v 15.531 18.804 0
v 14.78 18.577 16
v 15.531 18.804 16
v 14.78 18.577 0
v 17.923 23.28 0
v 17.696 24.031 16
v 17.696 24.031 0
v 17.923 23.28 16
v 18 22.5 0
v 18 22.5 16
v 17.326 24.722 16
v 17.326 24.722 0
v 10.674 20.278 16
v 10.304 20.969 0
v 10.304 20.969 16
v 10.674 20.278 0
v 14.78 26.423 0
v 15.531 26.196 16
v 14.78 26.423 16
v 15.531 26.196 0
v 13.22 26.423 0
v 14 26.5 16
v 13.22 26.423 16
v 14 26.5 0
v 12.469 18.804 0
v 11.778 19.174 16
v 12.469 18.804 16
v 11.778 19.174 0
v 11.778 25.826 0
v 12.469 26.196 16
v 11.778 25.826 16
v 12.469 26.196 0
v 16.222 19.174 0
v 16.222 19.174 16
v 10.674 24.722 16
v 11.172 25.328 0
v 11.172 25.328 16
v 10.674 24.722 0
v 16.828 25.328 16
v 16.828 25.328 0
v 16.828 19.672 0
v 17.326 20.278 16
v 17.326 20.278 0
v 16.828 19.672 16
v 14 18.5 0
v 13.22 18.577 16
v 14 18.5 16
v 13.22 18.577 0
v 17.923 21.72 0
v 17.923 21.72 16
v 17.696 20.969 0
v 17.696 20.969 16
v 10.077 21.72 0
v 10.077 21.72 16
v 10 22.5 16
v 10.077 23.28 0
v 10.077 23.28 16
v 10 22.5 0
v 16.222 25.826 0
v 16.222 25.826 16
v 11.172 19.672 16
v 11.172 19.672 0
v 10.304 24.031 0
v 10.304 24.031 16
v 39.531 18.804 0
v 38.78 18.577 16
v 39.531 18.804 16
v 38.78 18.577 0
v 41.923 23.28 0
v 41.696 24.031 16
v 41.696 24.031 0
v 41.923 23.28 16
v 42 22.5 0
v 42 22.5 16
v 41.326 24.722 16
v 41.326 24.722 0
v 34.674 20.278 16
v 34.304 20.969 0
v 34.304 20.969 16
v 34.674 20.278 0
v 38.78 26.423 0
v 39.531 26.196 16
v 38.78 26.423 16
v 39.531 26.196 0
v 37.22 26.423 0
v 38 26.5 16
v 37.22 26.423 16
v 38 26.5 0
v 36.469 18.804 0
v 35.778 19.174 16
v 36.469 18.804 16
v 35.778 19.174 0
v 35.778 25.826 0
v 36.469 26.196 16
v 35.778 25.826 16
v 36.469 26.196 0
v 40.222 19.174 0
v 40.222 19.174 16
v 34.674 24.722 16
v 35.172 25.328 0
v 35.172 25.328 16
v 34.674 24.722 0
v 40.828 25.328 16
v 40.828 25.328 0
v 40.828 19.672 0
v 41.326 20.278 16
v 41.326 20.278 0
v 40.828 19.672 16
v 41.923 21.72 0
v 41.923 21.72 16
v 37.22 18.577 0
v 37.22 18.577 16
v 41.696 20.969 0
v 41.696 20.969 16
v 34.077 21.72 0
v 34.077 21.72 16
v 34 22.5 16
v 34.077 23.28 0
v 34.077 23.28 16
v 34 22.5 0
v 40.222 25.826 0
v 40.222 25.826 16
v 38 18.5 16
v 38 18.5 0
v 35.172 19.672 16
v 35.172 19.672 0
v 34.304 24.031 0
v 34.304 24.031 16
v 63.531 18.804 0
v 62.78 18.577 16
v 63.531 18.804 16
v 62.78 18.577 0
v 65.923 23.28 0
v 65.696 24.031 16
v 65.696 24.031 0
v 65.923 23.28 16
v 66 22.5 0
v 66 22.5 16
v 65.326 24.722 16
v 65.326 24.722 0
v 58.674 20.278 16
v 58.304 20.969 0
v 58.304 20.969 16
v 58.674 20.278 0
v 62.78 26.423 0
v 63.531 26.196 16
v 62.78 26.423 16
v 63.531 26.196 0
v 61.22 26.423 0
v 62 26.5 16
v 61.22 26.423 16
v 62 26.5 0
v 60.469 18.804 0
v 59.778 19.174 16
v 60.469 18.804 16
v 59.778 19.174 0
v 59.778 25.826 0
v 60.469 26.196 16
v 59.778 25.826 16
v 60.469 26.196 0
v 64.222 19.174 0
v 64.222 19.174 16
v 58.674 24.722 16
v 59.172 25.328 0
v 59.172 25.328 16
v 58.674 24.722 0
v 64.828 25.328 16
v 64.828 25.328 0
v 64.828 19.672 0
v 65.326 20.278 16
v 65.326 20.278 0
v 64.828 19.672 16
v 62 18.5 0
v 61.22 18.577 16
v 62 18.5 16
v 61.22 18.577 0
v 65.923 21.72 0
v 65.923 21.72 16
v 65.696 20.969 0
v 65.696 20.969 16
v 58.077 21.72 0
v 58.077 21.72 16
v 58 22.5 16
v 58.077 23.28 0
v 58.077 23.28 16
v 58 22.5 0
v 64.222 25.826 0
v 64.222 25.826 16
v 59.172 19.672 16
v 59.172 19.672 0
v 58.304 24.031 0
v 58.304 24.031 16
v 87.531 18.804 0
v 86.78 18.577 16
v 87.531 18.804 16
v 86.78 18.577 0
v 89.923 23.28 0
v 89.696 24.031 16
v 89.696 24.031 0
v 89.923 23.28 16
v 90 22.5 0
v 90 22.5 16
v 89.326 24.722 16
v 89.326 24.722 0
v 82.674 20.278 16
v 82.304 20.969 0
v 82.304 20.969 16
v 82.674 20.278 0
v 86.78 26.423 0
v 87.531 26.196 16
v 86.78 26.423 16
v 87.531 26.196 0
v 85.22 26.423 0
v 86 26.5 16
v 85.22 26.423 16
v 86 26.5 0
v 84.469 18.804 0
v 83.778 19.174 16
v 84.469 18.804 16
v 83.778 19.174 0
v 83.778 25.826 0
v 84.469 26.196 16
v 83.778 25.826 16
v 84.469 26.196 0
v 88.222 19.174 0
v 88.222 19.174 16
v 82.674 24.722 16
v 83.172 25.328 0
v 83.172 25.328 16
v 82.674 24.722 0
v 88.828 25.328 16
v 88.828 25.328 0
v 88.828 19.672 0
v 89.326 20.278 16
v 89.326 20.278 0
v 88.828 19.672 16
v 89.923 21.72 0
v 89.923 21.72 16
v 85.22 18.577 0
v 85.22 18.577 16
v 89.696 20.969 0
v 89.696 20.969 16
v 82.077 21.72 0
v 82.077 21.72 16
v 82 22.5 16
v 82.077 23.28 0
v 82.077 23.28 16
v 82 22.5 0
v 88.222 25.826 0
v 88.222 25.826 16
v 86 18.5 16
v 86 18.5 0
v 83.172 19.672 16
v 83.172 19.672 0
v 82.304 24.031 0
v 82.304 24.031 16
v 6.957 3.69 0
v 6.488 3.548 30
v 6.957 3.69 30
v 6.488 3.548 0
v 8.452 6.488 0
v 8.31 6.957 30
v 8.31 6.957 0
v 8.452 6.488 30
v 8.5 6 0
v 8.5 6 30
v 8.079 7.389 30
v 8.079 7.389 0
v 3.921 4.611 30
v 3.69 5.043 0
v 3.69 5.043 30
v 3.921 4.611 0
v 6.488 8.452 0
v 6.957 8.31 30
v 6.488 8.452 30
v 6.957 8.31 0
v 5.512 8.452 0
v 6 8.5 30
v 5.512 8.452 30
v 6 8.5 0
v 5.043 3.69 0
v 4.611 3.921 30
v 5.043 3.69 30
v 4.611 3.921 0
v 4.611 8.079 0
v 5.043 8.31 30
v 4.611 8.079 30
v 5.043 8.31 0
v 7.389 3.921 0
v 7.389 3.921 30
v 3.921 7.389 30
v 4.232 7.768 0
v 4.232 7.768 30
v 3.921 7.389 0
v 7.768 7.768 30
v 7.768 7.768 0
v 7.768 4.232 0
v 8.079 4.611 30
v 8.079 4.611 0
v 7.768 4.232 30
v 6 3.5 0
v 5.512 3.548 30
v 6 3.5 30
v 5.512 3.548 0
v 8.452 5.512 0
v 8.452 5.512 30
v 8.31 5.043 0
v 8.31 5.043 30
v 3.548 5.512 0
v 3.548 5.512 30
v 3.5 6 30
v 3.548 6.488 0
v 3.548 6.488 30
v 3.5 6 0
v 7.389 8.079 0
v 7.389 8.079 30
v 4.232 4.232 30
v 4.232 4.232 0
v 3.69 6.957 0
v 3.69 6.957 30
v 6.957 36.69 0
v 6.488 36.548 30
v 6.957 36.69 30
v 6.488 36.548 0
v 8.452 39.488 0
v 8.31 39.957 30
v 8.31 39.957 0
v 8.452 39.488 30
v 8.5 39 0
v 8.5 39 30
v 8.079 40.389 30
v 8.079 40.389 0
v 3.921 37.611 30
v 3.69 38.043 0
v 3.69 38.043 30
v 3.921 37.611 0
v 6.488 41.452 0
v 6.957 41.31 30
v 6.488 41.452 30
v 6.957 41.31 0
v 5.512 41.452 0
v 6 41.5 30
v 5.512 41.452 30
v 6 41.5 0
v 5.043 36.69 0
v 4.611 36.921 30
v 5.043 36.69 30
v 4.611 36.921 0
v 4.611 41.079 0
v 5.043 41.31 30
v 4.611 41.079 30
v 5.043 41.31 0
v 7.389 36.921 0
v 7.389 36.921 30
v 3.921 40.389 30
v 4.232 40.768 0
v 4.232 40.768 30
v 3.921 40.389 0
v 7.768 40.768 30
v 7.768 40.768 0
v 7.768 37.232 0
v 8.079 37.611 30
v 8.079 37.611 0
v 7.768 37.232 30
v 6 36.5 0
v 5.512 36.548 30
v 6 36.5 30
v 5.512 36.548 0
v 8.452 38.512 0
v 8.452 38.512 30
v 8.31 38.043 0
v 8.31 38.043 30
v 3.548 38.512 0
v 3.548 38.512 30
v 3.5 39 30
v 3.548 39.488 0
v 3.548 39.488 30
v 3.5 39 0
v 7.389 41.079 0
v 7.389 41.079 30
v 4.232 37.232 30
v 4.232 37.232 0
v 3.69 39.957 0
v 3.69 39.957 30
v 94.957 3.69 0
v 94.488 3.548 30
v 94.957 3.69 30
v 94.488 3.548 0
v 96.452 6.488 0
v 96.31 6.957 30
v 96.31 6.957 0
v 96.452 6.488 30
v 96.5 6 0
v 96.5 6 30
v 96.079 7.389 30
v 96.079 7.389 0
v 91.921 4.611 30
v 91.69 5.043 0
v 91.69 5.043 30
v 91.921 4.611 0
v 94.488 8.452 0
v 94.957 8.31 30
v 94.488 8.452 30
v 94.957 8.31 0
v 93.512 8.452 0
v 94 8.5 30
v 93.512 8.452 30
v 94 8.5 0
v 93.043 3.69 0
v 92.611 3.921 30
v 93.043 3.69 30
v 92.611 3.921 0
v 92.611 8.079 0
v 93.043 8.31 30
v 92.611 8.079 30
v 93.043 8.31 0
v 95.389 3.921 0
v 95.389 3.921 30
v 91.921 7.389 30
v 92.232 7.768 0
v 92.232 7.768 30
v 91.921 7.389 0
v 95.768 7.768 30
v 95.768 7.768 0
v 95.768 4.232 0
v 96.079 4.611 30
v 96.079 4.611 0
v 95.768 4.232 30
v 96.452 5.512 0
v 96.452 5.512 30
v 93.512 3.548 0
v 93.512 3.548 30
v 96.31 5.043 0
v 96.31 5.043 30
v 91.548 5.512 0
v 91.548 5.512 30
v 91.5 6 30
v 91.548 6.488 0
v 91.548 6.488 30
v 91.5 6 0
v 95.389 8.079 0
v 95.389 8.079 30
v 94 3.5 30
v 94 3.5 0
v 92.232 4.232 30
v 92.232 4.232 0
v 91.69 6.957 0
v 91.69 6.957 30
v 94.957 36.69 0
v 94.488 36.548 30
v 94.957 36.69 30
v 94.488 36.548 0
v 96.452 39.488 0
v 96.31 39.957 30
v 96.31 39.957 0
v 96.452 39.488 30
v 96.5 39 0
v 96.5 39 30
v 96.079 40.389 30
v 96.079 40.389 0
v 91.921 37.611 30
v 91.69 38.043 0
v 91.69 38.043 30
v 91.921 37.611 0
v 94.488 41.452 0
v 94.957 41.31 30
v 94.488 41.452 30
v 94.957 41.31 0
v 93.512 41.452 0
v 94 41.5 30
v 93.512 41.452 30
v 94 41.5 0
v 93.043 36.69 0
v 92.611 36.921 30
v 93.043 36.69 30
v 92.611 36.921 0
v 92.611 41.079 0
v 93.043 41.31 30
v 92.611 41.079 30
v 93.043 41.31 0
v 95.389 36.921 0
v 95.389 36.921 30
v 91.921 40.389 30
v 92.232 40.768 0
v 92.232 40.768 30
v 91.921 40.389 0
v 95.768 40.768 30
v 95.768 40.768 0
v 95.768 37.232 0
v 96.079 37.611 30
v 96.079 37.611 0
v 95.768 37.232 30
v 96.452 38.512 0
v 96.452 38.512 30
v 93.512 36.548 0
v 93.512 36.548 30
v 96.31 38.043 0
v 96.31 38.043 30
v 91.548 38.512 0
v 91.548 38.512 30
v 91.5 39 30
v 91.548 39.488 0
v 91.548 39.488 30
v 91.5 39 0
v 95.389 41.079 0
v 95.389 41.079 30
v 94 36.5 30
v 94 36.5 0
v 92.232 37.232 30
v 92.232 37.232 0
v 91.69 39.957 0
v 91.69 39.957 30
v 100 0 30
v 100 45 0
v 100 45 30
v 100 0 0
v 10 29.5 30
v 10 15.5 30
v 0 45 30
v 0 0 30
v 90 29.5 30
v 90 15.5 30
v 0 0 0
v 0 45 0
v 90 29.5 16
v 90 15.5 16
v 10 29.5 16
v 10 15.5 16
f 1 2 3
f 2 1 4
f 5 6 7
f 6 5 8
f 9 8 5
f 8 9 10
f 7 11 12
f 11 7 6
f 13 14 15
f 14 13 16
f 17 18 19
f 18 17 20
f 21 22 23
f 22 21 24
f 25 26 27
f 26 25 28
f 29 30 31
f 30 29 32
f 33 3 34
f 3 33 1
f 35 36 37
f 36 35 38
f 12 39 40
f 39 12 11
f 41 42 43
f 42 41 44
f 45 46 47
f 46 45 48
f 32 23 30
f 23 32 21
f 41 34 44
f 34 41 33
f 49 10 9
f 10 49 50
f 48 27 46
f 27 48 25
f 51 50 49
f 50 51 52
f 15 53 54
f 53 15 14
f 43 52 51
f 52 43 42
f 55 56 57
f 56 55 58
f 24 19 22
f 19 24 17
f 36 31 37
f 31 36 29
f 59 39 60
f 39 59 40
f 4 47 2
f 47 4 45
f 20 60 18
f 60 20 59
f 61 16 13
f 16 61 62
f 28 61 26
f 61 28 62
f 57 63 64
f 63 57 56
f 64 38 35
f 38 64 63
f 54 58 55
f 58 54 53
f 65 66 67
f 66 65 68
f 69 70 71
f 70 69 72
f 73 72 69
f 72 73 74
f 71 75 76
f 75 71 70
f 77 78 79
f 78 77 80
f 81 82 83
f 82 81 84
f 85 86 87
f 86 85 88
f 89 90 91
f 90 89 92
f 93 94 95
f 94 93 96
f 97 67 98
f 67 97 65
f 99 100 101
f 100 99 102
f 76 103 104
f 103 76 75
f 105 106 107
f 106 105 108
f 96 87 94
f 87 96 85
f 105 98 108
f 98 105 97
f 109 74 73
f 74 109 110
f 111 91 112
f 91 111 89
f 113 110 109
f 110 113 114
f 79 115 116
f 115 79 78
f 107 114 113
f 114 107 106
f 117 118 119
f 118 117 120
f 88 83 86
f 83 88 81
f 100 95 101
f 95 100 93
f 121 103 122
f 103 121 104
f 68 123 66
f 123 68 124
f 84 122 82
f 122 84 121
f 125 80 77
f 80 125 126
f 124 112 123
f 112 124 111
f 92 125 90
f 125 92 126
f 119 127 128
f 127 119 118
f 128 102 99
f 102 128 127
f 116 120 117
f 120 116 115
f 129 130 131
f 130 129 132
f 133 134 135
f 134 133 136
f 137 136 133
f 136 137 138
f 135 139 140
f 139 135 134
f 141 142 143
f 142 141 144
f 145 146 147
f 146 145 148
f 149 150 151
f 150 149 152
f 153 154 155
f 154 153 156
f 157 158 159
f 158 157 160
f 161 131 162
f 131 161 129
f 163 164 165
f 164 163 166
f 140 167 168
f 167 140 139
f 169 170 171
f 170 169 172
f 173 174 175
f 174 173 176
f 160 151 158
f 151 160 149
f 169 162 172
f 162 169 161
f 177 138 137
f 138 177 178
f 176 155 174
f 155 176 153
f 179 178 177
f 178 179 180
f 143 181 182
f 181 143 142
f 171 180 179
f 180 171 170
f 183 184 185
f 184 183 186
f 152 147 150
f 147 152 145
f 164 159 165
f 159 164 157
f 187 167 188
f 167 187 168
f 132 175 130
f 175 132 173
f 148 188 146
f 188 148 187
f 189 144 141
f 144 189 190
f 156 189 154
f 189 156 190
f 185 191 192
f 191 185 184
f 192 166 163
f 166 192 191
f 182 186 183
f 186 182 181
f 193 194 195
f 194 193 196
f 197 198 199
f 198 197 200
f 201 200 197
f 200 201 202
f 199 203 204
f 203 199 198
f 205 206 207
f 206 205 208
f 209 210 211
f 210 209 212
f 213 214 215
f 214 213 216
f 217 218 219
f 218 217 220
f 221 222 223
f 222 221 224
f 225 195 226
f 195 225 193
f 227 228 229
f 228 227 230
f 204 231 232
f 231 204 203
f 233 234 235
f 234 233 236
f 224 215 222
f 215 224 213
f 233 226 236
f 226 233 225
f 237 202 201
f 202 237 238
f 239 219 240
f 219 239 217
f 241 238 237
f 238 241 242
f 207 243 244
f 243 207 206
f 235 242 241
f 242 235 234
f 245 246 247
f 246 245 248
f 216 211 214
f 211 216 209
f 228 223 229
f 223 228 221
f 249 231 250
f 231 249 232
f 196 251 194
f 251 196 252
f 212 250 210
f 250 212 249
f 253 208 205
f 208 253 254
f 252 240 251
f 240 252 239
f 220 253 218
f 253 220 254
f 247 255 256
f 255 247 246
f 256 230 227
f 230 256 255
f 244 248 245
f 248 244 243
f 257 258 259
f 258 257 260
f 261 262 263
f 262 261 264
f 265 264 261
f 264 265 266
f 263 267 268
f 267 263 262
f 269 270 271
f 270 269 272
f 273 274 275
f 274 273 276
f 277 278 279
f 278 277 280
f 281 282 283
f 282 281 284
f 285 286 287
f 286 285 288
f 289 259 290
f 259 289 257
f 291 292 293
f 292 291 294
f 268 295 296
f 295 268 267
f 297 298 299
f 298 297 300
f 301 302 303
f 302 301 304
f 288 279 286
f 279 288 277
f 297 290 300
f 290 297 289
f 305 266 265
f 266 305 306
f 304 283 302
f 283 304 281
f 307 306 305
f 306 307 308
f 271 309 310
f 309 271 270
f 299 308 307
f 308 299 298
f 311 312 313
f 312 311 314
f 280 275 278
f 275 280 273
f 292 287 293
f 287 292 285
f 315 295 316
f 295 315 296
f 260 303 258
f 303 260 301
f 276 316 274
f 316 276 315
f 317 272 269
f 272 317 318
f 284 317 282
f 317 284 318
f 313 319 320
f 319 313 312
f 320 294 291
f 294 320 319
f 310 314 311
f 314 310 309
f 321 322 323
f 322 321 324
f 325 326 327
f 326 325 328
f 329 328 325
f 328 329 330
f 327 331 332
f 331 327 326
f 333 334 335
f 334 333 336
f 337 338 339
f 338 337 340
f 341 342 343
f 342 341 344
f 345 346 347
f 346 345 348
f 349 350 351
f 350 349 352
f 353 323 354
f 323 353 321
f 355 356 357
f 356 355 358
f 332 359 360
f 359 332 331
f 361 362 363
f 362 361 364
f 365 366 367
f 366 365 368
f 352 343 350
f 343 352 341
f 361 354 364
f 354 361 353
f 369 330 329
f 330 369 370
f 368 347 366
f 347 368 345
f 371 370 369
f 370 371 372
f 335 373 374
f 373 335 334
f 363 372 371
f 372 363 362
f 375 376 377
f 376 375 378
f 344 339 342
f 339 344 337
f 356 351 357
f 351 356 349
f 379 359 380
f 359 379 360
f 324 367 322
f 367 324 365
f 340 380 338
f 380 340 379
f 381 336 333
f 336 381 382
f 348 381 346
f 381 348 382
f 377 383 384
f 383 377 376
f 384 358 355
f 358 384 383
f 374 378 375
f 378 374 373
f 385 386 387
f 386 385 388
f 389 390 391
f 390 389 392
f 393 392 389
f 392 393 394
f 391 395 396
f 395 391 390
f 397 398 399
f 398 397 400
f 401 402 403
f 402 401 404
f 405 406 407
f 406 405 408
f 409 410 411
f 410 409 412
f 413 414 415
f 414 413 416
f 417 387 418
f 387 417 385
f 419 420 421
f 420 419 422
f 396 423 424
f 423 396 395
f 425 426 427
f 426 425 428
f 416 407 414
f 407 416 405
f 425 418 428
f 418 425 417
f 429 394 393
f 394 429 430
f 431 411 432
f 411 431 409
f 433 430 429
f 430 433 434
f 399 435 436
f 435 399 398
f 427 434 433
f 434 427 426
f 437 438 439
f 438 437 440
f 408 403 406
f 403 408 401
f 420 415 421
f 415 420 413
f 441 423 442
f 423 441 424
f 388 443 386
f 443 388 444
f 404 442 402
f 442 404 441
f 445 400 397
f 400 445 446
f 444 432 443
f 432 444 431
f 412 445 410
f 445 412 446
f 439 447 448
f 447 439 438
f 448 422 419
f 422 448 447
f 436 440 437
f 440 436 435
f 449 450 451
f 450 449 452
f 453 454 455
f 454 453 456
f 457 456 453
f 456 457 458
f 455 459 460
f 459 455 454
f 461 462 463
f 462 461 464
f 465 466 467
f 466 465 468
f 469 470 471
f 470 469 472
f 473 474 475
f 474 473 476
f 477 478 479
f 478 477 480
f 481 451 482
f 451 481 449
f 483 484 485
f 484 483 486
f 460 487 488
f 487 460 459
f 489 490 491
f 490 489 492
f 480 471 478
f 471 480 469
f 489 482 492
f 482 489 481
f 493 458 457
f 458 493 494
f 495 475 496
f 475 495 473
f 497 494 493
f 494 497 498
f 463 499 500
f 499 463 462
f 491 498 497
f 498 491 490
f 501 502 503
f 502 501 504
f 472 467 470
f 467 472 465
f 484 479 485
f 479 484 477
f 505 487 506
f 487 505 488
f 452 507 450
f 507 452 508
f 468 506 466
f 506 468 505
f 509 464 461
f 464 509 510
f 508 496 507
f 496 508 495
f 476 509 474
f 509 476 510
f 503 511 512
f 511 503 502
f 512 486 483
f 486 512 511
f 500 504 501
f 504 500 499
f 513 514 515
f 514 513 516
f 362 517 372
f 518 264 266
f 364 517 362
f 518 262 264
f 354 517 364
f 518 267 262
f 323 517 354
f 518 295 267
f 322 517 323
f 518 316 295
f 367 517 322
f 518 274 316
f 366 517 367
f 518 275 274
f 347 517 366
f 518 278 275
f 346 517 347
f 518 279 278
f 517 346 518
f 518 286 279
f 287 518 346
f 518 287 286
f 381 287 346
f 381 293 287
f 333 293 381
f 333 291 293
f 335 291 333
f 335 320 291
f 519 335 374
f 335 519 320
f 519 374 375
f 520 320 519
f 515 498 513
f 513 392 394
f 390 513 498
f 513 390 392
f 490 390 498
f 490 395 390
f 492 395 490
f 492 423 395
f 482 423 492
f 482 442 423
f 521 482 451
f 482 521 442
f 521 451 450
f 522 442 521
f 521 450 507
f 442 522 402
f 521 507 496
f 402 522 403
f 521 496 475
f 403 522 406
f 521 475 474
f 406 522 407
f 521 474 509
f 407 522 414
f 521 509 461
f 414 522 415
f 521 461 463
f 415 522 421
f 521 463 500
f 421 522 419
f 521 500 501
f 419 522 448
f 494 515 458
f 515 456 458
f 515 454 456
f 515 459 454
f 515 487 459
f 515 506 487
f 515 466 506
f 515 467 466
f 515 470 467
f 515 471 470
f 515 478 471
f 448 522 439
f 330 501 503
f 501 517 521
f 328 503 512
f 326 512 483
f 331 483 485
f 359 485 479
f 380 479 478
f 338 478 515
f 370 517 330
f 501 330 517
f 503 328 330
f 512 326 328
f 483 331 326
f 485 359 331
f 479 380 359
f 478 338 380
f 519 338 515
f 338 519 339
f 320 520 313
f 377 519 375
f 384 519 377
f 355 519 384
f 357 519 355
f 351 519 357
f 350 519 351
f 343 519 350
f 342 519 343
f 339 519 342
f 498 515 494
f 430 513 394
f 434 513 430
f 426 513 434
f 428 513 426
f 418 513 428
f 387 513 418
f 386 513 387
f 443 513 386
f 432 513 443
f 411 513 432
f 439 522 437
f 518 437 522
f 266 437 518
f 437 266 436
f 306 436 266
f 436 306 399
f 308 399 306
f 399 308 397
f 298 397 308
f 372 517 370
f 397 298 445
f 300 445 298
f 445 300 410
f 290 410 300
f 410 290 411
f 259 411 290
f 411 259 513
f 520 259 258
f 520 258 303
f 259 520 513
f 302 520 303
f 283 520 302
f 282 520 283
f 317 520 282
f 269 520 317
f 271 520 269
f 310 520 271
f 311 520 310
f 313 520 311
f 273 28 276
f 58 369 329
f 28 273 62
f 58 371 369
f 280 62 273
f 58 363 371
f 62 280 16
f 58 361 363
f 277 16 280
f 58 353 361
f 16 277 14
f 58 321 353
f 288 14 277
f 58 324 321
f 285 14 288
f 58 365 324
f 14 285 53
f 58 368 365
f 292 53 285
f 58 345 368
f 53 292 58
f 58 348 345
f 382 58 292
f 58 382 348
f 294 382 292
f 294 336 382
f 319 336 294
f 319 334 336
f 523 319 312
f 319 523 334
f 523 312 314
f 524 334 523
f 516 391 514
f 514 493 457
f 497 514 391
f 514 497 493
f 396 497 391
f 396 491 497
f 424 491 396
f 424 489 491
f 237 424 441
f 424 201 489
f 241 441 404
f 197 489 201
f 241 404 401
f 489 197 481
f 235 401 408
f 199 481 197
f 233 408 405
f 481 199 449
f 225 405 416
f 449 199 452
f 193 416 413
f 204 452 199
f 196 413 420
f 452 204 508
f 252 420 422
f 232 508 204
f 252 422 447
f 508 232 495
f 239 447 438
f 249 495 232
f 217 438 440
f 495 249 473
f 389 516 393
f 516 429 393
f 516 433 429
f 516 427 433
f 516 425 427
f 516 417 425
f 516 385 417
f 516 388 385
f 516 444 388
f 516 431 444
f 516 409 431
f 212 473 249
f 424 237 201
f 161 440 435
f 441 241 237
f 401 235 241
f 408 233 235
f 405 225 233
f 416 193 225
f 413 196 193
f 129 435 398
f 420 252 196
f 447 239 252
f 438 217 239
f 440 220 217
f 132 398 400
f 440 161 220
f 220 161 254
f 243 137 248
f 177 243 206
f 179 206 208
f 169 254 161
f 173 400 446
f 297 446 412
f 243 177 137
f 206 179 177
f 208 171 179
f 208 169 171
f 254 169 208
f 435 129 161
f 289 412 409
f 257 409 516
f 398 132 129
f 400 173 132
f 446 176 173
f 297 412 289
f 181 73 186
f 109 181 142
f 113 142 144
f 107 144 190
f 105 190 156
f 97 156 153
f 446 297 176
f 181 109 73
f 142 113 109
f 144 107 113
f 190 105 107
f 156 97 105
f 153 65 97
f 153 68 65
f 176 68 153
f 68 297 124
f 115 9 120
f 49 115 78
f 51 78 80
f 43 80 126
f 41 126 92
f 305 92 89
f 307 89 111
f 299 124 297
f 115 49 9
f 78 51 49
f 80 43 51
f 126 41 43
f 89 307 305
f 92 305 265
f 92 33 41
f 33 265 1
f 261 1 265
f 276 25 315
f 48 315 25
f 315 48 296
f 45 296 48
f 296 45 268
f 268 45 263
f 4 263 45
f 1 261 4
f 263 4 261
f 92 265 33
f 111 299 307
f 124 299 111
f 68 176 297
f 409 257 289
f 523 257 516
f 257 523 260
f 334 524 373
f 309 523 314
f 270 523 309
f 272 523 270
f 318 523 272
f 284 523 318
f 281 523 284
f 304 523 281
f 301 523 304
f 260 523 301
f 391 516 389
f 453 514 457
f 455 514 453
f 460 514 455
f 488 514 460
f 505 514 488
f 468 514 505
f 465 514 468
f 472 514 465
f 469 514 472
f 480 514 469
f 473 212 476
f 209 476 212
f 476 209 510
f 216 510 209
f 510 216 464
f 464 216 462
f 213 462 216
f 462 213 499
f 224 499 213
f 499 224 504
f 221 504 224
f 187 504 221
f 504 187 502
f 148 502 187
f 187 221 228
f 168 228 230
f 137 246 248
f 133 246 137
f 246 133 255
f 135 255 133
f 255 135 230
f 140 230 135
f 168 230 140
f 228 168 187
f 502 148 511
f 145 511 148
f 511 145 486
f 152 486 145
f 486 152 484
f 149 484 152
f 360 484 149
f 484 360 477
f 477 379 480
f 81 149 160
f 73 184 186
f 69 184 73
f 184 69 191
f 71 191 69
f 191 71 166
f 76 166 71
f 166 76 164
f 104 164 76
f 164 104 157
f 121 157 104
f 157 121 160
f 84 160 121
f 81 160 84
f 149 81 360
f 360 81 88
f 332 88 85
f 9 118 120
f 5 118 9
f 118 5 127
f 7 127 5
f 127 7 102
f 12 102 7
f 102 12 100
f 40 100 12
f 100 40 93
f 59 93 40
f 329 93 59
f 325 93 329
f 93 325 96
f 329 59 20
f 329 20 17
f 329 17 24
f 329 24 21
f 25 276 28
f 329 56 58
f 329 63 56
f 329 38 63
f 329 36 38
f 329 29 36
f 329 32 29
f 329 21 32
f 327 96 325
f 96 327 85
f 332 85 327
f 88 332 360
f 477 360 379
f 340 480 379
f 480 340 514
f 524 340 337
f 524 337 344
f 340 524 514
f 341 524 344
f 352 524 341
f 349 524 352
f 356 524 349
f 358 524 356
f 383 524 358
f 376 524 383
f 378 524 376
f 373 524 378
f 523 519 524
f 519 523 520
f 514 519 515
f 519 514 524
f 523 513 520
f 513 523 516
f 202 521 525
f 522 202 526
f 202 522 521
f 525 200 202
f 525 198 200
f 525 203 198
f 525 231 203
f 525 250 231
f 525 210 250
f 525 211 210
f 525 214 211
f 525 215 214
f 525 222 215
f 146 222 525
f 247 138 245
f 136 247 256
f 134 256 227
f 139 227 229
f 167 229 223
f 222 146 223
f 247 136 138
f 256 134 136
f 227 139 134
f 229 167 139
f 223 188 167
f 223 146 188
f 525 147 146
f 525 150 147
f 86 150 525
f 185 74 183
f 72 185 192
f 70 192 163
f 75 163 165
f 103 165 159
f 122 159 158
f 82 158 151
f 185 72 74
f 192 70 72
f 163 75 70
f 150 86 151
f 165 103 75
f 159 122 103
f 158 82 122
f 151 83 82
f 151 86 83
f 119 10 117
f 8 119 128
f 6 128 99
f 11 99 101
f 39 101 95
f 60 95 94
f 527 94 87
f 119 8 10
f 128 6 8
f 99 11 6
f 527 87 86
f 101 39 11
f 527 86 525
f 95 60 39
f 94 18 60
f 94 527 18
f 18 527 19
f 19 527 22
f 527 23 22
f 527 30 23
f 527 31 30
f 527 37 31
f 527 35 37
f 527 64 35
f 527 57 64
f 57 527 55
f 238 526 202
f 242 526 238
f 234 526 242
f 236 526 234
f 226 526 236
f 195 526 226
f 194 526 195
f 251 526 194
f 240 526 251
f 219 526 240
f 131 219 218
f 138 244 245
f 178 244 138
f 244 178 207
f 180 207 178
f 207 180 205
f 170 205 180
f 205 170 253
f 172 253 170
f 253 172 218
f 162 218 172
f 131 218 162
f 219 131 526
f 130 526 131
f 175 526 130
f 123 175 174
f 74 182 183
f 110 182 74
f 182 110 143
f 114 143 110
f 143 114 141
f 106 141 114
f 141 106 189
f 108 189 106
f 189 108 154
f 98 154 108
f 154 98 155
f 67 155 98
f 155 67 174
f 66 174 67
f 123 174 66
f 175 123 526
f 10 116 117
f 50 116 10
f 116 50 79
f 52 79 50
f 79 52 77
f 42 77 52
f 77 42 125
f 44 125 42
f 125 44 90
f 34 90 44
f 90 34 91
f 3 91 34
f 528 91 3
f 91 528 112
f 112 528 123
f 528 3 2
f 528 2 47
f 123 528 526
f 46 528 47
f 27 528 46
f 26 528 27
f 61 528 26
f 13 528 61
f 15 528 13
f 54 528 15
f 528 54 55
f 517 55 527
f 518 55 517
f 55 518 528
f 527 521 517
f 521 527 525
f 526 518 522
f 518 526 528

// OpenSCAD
$fn = 32;

// ----------------------------------------------------------------------
// Manifold block: gallery_top manifold
// ----------------------------------------------------------------------

// --- parameters (mm) ---
block_l = 100;            // block length, X
block_w = 45;             // block width, Y
block_h = 30;             // block height, Z
port_d = 8;               // port bore diameter
port_pitch = 24;          // port pitch along X
gallery_d = 14;           // top gallery width, Y
gallery_depth = 14;       // gallery pocket depth
wall_p = 10;              // gallery end wall thickness, X
mnt_d = 5;                // mounting hole diameter
mnt_in = 6;               // mounting hole inset from the edges

n_ports = 4;  // ports in the row
port_x0 = (block_l - (n_ports - 1) * port_pitch) / 2;  // first port X

difference() {
  cube([block_l, block_w, block_h]);
  for (i = [0 : n_ports - 1])
    translate([port_x0 + i * port_pitch, block_w / 2, -1])
      cylinder(h = block_h + 2, d = port_d);
  translate([wall_p, block_w / 2 - gallery_d / 2, block_h - gallery_depth])
    cube([block_l - 2 * wall_p, gallery_d, gallery_depth + 1]);
  for (cx = [mnt_in, block_l - mnt_in])
    for (cy = [mnt_in, block_w - mnt_in])
      translate([cx, cy, -1]) cylinder(h = block_h + 2, d = mnt_d);
}
